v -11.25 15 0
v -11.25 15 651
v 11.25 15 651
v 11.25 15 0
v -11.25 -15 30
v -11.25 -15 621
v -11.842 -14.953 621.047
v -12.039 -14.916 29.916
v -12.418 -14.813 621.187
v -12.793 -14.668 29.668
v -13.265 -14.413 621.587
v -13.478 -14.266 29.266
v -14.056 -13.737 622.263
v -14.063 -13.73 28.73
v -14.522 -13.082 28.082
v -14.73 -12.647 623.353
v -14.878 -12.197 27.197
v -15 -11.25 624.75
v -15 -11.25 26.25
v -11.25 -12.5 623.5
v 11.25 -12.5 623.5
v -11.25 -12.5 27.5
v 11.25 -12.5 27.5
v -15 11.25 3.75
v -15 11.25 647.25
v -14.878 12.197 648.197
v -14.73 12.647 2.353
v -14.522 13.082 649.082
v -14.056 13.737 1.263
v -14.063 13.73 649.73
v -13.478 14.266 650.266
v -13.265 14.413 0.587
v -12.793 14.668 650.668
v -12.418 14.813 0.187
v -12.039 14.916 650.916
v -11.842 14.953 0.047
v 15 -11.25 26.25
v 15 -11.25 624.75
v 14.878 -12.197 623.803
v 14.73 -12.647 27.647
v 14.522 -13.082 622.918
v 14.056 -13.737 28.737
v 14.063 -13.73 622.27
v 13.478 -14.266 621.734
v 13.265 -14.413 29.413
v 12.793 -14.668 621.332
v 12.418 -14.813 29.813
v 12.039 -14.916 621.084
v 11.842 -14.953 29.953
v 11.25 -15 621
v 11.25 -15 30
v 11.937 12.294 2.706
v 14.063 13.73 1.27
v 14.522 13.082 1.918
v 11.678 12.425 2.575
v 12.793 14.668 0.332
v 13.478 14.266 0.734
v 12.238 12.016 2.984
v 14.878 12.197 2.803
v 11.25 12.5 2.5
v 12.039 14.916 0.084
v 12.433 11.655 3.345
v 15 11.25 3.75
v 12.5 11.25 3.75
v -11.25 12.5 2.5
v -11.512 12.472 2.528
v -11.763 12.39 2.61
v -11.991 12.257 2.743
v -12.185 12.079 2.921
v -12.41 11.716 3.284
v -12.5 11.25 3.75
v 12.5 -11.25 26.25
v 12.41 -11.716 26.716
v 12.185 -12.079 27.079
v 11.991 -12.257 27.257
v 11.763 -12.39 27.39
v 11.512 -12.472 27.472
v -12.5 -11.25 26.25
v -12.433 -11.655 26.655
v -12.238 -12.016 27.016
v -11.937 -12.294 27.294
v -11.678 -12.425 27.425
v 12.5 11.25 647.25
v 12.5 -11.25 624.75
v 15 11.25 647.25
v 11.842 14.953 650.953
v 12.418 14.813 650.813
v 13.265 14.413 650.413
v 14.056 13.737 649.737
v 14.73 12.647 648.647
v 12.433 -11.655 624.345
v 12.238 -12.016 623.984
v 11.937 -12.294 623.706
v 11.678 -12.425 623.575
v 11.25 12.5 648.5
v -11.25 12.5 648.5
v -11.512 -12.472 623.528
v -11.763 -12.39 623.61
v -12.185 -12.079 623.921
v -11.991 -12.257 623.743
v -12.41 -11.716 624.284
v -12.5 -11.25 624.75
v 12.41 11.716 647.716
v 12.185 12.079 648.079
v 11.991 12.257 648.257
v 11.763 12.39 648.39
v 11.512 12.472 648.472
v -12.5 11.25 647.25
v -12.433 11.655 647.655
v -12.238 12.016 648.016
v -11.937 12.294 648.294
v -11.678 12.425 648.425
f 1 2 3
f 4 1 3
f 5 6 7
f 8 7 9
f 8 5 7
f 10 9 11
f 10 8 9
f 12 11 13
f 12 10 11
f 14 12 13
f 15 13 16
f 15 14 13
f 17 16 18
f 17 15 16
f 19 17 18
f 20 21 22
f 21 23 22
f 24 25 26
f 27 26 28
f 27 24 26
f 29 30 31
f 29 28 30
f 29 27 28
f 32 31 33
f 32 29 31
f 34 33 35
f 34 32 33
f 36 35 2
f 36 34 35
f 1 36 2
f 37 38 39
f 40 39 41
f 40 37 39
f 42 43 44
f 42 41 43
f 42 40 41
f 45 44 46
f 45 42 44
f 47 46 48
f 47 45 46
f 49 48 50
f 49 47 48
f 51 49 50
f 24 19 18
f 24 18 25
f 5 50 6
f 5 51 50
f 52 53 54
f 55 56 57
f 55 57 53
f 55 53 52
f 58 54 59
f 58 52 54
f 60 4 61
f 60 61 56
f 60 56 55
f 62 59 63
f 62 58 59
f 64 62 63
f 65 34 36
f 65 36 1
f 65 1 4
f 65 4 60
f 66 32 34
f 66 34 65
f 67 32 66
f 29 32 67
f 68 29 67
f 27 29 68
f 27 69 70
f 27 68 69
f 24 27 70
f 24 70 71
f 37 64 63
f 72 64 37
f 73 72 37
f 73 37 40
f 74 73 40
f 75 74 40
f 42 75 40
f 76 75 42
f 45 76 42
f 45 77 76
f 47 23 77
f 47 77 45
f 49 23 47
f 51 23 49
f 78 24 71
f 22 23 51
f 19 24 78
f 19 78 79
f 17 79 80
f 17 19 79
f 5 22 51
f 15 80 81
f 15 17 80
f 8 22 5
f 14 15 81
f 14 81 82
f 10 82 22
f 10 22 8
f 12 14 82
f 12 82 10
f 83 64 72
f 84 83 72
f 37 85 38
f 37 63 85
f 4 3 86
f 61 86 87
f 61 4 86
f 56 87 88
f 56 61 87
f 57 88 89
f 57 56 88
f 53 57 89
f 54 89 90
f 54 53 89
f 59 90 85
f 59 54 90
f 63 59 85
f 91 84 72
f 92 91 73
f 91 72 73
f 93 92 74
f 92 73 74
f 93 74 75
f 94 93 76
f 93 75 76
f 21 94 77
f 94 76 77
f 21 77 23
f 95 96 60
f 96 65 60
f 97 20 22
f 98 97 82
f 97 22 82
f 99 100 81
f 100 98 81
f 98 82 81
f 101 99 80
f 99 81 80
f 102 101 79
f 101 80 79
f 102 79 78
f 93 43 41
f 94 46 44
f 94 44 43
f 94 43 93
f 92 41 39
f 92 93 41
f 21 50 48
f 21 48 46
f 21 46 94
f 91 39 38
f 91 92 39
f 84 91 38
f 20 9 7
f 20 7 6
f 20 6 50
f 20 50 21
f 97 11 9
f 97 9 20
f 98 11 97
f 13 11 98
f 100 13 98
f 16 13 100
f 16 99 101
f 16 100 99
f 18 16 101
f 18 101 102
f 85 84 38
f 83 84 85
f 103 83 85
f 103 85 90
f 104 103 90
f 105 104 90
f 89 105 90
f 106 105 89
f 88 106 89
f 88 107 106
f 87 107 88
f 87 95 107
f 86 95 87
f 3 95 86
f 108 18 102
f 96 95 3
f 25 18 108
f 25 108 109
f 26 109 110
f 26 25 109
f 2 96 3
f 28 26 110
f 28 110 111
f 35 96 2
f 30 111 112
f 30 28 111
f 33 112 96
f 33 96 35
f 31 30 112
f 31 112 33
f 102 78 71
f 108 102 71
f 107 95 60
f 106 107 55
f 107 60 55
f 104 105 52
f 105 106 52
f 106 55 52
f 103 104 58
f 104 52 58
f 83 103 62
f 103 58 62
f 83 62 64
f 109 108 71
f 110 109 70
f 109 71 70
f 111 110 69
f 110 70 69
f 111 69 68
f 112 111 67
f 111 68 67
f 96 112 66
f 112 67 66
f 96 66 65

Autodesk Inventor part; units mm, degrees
ref_plane "Start plane" through (0, 0, 0) normal (0, 0, 1) x (1, 0, 0)
ref_plane "End plane" through (0, 0, 651) normal (0, 0, 1) x (1, 0, 0)
sketch "Sketch" plane through (0, 0, 0) normal (0, 0, 1) x (1, 0, 0)
  line L0 (-15, -11.25) -> (-15, 11.25)
  line L1 (-11.25, 15) -> (11.25, 15)
  line L2 (15, 11.25) -> (15, -11.25)
  line L3 (11.25, -15) -> (-11.25, -15)
  arc A0 (-15, -11.25) -> (-11.25, -15) centre (-11.25, -11.25) ccw
  arc A1 (-11.25, 15) -> (-15, 11.25) centre (-11.25, 11.25) ccw
  arc A2 (15, 11.25) -> (11.25, 15) centre (11.25, 11.25) ccw
  arc A3 (11.25, -15) -> (15, -11.25) centre (11.25, -11.25) ccw
  arc A4 (-11.25, 12.5) -> (-12.5, 11.25) centre (-11.25, 11.25) ccw
  line L4 (-11.25, 12.5) -> (11.25, 12.5)
  arc A5 (12.5, 11.25) -> (11.25, 12.5) centre (11.25, 11.25) ccw
  line L5 (12.5, 11.25) -> (12.5, -11.25)
  arc A6 (11.25, -12.5) -> (12.5, -11.25) centre (11.25, -11.25) ccw
  line L6 (11.25, -12.5) -> (-11.25, -12.5)
  arc A7 (-12.5, -11.25) -> (-11.25, -12.5) centre (-11.25, -11.25) ccw
  line L7 (-12.5, -11.25) -> (-12.5, 11.25)
  line L8 (0, 22.0873) -> (0, -22.0873) construction
  line L9 (-22.0873, 0) -> (22.0873, 0) construction
  dimension "d7" = 3.75
  dimension "d10" = 30
  dimension "d11" = 30
  dimension "d12" = 2.5
  dimension "d15" = 15
  dimension "d16" = 15
extrude "Body" add sketch "Sketch" along normal up to surface (651 mm away) from surface at 0
sketch "Sketch3" plane through (0, 0, 0) normal (0, 0, 1) x (1, 0, 0)
  line L0 (0, 0) -> (10, 0)
ref_plane "Work Plane3" through (0, 0, 0) normal (0, -1, 0) x (1, 0, 0)
sketch "Sketch4" plane through (0, 0, 0) normal (0, -1, 0) x (1, 0, 0)
  line L0 (-2, 0) -> (12, 0)
  line L1 (-2, 651) -> (12, 651)
  dimension "d18" = 651
ref_plane "Work Plane5" through (0, 15, 651) normal (0, -0.7071, 0.7071) x (1, 0, 0)
split "Split2" plane through (0, 15, 651) removes the side toward (0, -0.7071, 0.7071)
ref_plane "Work Plane6" through (0, 15, 0) normal (0, -0.7071, -0.7071) x (1, 0, 0)
split "Split3" plane through (0, 15, 0) removes the side toward (0, -0.7071, -0.7071)
equation "\"d7\" = G_IR"
equation "\"d10\" = G_H"
equation "\"d11\" = G_W"
equation "\"d12\" = G_T"
equation "\"d15\" = 0.5 * d10"
equation "\"d16\" = 0.5 * d11"
equation "\"d3\" = G_L"
equation "\"G_W\" = 30"
equation "\"G_H\" = 30"
equation "\"G_T\" = 2.5"
equation "\"G_IR\" = 3.75"
equation "\"G_L\" = d18"
equation "\"G_OFFSET_START\" = 0"
equation "\"G_OFFSET_END\" = 0"
equation "\"d14\" = G_OFFSET_END + B_L"
equation "\"B_L\" = 651"
properties part number "DIN EN 10305-5 - 30 x 30 x 2,5  - 651" material "Steel, Mild"
